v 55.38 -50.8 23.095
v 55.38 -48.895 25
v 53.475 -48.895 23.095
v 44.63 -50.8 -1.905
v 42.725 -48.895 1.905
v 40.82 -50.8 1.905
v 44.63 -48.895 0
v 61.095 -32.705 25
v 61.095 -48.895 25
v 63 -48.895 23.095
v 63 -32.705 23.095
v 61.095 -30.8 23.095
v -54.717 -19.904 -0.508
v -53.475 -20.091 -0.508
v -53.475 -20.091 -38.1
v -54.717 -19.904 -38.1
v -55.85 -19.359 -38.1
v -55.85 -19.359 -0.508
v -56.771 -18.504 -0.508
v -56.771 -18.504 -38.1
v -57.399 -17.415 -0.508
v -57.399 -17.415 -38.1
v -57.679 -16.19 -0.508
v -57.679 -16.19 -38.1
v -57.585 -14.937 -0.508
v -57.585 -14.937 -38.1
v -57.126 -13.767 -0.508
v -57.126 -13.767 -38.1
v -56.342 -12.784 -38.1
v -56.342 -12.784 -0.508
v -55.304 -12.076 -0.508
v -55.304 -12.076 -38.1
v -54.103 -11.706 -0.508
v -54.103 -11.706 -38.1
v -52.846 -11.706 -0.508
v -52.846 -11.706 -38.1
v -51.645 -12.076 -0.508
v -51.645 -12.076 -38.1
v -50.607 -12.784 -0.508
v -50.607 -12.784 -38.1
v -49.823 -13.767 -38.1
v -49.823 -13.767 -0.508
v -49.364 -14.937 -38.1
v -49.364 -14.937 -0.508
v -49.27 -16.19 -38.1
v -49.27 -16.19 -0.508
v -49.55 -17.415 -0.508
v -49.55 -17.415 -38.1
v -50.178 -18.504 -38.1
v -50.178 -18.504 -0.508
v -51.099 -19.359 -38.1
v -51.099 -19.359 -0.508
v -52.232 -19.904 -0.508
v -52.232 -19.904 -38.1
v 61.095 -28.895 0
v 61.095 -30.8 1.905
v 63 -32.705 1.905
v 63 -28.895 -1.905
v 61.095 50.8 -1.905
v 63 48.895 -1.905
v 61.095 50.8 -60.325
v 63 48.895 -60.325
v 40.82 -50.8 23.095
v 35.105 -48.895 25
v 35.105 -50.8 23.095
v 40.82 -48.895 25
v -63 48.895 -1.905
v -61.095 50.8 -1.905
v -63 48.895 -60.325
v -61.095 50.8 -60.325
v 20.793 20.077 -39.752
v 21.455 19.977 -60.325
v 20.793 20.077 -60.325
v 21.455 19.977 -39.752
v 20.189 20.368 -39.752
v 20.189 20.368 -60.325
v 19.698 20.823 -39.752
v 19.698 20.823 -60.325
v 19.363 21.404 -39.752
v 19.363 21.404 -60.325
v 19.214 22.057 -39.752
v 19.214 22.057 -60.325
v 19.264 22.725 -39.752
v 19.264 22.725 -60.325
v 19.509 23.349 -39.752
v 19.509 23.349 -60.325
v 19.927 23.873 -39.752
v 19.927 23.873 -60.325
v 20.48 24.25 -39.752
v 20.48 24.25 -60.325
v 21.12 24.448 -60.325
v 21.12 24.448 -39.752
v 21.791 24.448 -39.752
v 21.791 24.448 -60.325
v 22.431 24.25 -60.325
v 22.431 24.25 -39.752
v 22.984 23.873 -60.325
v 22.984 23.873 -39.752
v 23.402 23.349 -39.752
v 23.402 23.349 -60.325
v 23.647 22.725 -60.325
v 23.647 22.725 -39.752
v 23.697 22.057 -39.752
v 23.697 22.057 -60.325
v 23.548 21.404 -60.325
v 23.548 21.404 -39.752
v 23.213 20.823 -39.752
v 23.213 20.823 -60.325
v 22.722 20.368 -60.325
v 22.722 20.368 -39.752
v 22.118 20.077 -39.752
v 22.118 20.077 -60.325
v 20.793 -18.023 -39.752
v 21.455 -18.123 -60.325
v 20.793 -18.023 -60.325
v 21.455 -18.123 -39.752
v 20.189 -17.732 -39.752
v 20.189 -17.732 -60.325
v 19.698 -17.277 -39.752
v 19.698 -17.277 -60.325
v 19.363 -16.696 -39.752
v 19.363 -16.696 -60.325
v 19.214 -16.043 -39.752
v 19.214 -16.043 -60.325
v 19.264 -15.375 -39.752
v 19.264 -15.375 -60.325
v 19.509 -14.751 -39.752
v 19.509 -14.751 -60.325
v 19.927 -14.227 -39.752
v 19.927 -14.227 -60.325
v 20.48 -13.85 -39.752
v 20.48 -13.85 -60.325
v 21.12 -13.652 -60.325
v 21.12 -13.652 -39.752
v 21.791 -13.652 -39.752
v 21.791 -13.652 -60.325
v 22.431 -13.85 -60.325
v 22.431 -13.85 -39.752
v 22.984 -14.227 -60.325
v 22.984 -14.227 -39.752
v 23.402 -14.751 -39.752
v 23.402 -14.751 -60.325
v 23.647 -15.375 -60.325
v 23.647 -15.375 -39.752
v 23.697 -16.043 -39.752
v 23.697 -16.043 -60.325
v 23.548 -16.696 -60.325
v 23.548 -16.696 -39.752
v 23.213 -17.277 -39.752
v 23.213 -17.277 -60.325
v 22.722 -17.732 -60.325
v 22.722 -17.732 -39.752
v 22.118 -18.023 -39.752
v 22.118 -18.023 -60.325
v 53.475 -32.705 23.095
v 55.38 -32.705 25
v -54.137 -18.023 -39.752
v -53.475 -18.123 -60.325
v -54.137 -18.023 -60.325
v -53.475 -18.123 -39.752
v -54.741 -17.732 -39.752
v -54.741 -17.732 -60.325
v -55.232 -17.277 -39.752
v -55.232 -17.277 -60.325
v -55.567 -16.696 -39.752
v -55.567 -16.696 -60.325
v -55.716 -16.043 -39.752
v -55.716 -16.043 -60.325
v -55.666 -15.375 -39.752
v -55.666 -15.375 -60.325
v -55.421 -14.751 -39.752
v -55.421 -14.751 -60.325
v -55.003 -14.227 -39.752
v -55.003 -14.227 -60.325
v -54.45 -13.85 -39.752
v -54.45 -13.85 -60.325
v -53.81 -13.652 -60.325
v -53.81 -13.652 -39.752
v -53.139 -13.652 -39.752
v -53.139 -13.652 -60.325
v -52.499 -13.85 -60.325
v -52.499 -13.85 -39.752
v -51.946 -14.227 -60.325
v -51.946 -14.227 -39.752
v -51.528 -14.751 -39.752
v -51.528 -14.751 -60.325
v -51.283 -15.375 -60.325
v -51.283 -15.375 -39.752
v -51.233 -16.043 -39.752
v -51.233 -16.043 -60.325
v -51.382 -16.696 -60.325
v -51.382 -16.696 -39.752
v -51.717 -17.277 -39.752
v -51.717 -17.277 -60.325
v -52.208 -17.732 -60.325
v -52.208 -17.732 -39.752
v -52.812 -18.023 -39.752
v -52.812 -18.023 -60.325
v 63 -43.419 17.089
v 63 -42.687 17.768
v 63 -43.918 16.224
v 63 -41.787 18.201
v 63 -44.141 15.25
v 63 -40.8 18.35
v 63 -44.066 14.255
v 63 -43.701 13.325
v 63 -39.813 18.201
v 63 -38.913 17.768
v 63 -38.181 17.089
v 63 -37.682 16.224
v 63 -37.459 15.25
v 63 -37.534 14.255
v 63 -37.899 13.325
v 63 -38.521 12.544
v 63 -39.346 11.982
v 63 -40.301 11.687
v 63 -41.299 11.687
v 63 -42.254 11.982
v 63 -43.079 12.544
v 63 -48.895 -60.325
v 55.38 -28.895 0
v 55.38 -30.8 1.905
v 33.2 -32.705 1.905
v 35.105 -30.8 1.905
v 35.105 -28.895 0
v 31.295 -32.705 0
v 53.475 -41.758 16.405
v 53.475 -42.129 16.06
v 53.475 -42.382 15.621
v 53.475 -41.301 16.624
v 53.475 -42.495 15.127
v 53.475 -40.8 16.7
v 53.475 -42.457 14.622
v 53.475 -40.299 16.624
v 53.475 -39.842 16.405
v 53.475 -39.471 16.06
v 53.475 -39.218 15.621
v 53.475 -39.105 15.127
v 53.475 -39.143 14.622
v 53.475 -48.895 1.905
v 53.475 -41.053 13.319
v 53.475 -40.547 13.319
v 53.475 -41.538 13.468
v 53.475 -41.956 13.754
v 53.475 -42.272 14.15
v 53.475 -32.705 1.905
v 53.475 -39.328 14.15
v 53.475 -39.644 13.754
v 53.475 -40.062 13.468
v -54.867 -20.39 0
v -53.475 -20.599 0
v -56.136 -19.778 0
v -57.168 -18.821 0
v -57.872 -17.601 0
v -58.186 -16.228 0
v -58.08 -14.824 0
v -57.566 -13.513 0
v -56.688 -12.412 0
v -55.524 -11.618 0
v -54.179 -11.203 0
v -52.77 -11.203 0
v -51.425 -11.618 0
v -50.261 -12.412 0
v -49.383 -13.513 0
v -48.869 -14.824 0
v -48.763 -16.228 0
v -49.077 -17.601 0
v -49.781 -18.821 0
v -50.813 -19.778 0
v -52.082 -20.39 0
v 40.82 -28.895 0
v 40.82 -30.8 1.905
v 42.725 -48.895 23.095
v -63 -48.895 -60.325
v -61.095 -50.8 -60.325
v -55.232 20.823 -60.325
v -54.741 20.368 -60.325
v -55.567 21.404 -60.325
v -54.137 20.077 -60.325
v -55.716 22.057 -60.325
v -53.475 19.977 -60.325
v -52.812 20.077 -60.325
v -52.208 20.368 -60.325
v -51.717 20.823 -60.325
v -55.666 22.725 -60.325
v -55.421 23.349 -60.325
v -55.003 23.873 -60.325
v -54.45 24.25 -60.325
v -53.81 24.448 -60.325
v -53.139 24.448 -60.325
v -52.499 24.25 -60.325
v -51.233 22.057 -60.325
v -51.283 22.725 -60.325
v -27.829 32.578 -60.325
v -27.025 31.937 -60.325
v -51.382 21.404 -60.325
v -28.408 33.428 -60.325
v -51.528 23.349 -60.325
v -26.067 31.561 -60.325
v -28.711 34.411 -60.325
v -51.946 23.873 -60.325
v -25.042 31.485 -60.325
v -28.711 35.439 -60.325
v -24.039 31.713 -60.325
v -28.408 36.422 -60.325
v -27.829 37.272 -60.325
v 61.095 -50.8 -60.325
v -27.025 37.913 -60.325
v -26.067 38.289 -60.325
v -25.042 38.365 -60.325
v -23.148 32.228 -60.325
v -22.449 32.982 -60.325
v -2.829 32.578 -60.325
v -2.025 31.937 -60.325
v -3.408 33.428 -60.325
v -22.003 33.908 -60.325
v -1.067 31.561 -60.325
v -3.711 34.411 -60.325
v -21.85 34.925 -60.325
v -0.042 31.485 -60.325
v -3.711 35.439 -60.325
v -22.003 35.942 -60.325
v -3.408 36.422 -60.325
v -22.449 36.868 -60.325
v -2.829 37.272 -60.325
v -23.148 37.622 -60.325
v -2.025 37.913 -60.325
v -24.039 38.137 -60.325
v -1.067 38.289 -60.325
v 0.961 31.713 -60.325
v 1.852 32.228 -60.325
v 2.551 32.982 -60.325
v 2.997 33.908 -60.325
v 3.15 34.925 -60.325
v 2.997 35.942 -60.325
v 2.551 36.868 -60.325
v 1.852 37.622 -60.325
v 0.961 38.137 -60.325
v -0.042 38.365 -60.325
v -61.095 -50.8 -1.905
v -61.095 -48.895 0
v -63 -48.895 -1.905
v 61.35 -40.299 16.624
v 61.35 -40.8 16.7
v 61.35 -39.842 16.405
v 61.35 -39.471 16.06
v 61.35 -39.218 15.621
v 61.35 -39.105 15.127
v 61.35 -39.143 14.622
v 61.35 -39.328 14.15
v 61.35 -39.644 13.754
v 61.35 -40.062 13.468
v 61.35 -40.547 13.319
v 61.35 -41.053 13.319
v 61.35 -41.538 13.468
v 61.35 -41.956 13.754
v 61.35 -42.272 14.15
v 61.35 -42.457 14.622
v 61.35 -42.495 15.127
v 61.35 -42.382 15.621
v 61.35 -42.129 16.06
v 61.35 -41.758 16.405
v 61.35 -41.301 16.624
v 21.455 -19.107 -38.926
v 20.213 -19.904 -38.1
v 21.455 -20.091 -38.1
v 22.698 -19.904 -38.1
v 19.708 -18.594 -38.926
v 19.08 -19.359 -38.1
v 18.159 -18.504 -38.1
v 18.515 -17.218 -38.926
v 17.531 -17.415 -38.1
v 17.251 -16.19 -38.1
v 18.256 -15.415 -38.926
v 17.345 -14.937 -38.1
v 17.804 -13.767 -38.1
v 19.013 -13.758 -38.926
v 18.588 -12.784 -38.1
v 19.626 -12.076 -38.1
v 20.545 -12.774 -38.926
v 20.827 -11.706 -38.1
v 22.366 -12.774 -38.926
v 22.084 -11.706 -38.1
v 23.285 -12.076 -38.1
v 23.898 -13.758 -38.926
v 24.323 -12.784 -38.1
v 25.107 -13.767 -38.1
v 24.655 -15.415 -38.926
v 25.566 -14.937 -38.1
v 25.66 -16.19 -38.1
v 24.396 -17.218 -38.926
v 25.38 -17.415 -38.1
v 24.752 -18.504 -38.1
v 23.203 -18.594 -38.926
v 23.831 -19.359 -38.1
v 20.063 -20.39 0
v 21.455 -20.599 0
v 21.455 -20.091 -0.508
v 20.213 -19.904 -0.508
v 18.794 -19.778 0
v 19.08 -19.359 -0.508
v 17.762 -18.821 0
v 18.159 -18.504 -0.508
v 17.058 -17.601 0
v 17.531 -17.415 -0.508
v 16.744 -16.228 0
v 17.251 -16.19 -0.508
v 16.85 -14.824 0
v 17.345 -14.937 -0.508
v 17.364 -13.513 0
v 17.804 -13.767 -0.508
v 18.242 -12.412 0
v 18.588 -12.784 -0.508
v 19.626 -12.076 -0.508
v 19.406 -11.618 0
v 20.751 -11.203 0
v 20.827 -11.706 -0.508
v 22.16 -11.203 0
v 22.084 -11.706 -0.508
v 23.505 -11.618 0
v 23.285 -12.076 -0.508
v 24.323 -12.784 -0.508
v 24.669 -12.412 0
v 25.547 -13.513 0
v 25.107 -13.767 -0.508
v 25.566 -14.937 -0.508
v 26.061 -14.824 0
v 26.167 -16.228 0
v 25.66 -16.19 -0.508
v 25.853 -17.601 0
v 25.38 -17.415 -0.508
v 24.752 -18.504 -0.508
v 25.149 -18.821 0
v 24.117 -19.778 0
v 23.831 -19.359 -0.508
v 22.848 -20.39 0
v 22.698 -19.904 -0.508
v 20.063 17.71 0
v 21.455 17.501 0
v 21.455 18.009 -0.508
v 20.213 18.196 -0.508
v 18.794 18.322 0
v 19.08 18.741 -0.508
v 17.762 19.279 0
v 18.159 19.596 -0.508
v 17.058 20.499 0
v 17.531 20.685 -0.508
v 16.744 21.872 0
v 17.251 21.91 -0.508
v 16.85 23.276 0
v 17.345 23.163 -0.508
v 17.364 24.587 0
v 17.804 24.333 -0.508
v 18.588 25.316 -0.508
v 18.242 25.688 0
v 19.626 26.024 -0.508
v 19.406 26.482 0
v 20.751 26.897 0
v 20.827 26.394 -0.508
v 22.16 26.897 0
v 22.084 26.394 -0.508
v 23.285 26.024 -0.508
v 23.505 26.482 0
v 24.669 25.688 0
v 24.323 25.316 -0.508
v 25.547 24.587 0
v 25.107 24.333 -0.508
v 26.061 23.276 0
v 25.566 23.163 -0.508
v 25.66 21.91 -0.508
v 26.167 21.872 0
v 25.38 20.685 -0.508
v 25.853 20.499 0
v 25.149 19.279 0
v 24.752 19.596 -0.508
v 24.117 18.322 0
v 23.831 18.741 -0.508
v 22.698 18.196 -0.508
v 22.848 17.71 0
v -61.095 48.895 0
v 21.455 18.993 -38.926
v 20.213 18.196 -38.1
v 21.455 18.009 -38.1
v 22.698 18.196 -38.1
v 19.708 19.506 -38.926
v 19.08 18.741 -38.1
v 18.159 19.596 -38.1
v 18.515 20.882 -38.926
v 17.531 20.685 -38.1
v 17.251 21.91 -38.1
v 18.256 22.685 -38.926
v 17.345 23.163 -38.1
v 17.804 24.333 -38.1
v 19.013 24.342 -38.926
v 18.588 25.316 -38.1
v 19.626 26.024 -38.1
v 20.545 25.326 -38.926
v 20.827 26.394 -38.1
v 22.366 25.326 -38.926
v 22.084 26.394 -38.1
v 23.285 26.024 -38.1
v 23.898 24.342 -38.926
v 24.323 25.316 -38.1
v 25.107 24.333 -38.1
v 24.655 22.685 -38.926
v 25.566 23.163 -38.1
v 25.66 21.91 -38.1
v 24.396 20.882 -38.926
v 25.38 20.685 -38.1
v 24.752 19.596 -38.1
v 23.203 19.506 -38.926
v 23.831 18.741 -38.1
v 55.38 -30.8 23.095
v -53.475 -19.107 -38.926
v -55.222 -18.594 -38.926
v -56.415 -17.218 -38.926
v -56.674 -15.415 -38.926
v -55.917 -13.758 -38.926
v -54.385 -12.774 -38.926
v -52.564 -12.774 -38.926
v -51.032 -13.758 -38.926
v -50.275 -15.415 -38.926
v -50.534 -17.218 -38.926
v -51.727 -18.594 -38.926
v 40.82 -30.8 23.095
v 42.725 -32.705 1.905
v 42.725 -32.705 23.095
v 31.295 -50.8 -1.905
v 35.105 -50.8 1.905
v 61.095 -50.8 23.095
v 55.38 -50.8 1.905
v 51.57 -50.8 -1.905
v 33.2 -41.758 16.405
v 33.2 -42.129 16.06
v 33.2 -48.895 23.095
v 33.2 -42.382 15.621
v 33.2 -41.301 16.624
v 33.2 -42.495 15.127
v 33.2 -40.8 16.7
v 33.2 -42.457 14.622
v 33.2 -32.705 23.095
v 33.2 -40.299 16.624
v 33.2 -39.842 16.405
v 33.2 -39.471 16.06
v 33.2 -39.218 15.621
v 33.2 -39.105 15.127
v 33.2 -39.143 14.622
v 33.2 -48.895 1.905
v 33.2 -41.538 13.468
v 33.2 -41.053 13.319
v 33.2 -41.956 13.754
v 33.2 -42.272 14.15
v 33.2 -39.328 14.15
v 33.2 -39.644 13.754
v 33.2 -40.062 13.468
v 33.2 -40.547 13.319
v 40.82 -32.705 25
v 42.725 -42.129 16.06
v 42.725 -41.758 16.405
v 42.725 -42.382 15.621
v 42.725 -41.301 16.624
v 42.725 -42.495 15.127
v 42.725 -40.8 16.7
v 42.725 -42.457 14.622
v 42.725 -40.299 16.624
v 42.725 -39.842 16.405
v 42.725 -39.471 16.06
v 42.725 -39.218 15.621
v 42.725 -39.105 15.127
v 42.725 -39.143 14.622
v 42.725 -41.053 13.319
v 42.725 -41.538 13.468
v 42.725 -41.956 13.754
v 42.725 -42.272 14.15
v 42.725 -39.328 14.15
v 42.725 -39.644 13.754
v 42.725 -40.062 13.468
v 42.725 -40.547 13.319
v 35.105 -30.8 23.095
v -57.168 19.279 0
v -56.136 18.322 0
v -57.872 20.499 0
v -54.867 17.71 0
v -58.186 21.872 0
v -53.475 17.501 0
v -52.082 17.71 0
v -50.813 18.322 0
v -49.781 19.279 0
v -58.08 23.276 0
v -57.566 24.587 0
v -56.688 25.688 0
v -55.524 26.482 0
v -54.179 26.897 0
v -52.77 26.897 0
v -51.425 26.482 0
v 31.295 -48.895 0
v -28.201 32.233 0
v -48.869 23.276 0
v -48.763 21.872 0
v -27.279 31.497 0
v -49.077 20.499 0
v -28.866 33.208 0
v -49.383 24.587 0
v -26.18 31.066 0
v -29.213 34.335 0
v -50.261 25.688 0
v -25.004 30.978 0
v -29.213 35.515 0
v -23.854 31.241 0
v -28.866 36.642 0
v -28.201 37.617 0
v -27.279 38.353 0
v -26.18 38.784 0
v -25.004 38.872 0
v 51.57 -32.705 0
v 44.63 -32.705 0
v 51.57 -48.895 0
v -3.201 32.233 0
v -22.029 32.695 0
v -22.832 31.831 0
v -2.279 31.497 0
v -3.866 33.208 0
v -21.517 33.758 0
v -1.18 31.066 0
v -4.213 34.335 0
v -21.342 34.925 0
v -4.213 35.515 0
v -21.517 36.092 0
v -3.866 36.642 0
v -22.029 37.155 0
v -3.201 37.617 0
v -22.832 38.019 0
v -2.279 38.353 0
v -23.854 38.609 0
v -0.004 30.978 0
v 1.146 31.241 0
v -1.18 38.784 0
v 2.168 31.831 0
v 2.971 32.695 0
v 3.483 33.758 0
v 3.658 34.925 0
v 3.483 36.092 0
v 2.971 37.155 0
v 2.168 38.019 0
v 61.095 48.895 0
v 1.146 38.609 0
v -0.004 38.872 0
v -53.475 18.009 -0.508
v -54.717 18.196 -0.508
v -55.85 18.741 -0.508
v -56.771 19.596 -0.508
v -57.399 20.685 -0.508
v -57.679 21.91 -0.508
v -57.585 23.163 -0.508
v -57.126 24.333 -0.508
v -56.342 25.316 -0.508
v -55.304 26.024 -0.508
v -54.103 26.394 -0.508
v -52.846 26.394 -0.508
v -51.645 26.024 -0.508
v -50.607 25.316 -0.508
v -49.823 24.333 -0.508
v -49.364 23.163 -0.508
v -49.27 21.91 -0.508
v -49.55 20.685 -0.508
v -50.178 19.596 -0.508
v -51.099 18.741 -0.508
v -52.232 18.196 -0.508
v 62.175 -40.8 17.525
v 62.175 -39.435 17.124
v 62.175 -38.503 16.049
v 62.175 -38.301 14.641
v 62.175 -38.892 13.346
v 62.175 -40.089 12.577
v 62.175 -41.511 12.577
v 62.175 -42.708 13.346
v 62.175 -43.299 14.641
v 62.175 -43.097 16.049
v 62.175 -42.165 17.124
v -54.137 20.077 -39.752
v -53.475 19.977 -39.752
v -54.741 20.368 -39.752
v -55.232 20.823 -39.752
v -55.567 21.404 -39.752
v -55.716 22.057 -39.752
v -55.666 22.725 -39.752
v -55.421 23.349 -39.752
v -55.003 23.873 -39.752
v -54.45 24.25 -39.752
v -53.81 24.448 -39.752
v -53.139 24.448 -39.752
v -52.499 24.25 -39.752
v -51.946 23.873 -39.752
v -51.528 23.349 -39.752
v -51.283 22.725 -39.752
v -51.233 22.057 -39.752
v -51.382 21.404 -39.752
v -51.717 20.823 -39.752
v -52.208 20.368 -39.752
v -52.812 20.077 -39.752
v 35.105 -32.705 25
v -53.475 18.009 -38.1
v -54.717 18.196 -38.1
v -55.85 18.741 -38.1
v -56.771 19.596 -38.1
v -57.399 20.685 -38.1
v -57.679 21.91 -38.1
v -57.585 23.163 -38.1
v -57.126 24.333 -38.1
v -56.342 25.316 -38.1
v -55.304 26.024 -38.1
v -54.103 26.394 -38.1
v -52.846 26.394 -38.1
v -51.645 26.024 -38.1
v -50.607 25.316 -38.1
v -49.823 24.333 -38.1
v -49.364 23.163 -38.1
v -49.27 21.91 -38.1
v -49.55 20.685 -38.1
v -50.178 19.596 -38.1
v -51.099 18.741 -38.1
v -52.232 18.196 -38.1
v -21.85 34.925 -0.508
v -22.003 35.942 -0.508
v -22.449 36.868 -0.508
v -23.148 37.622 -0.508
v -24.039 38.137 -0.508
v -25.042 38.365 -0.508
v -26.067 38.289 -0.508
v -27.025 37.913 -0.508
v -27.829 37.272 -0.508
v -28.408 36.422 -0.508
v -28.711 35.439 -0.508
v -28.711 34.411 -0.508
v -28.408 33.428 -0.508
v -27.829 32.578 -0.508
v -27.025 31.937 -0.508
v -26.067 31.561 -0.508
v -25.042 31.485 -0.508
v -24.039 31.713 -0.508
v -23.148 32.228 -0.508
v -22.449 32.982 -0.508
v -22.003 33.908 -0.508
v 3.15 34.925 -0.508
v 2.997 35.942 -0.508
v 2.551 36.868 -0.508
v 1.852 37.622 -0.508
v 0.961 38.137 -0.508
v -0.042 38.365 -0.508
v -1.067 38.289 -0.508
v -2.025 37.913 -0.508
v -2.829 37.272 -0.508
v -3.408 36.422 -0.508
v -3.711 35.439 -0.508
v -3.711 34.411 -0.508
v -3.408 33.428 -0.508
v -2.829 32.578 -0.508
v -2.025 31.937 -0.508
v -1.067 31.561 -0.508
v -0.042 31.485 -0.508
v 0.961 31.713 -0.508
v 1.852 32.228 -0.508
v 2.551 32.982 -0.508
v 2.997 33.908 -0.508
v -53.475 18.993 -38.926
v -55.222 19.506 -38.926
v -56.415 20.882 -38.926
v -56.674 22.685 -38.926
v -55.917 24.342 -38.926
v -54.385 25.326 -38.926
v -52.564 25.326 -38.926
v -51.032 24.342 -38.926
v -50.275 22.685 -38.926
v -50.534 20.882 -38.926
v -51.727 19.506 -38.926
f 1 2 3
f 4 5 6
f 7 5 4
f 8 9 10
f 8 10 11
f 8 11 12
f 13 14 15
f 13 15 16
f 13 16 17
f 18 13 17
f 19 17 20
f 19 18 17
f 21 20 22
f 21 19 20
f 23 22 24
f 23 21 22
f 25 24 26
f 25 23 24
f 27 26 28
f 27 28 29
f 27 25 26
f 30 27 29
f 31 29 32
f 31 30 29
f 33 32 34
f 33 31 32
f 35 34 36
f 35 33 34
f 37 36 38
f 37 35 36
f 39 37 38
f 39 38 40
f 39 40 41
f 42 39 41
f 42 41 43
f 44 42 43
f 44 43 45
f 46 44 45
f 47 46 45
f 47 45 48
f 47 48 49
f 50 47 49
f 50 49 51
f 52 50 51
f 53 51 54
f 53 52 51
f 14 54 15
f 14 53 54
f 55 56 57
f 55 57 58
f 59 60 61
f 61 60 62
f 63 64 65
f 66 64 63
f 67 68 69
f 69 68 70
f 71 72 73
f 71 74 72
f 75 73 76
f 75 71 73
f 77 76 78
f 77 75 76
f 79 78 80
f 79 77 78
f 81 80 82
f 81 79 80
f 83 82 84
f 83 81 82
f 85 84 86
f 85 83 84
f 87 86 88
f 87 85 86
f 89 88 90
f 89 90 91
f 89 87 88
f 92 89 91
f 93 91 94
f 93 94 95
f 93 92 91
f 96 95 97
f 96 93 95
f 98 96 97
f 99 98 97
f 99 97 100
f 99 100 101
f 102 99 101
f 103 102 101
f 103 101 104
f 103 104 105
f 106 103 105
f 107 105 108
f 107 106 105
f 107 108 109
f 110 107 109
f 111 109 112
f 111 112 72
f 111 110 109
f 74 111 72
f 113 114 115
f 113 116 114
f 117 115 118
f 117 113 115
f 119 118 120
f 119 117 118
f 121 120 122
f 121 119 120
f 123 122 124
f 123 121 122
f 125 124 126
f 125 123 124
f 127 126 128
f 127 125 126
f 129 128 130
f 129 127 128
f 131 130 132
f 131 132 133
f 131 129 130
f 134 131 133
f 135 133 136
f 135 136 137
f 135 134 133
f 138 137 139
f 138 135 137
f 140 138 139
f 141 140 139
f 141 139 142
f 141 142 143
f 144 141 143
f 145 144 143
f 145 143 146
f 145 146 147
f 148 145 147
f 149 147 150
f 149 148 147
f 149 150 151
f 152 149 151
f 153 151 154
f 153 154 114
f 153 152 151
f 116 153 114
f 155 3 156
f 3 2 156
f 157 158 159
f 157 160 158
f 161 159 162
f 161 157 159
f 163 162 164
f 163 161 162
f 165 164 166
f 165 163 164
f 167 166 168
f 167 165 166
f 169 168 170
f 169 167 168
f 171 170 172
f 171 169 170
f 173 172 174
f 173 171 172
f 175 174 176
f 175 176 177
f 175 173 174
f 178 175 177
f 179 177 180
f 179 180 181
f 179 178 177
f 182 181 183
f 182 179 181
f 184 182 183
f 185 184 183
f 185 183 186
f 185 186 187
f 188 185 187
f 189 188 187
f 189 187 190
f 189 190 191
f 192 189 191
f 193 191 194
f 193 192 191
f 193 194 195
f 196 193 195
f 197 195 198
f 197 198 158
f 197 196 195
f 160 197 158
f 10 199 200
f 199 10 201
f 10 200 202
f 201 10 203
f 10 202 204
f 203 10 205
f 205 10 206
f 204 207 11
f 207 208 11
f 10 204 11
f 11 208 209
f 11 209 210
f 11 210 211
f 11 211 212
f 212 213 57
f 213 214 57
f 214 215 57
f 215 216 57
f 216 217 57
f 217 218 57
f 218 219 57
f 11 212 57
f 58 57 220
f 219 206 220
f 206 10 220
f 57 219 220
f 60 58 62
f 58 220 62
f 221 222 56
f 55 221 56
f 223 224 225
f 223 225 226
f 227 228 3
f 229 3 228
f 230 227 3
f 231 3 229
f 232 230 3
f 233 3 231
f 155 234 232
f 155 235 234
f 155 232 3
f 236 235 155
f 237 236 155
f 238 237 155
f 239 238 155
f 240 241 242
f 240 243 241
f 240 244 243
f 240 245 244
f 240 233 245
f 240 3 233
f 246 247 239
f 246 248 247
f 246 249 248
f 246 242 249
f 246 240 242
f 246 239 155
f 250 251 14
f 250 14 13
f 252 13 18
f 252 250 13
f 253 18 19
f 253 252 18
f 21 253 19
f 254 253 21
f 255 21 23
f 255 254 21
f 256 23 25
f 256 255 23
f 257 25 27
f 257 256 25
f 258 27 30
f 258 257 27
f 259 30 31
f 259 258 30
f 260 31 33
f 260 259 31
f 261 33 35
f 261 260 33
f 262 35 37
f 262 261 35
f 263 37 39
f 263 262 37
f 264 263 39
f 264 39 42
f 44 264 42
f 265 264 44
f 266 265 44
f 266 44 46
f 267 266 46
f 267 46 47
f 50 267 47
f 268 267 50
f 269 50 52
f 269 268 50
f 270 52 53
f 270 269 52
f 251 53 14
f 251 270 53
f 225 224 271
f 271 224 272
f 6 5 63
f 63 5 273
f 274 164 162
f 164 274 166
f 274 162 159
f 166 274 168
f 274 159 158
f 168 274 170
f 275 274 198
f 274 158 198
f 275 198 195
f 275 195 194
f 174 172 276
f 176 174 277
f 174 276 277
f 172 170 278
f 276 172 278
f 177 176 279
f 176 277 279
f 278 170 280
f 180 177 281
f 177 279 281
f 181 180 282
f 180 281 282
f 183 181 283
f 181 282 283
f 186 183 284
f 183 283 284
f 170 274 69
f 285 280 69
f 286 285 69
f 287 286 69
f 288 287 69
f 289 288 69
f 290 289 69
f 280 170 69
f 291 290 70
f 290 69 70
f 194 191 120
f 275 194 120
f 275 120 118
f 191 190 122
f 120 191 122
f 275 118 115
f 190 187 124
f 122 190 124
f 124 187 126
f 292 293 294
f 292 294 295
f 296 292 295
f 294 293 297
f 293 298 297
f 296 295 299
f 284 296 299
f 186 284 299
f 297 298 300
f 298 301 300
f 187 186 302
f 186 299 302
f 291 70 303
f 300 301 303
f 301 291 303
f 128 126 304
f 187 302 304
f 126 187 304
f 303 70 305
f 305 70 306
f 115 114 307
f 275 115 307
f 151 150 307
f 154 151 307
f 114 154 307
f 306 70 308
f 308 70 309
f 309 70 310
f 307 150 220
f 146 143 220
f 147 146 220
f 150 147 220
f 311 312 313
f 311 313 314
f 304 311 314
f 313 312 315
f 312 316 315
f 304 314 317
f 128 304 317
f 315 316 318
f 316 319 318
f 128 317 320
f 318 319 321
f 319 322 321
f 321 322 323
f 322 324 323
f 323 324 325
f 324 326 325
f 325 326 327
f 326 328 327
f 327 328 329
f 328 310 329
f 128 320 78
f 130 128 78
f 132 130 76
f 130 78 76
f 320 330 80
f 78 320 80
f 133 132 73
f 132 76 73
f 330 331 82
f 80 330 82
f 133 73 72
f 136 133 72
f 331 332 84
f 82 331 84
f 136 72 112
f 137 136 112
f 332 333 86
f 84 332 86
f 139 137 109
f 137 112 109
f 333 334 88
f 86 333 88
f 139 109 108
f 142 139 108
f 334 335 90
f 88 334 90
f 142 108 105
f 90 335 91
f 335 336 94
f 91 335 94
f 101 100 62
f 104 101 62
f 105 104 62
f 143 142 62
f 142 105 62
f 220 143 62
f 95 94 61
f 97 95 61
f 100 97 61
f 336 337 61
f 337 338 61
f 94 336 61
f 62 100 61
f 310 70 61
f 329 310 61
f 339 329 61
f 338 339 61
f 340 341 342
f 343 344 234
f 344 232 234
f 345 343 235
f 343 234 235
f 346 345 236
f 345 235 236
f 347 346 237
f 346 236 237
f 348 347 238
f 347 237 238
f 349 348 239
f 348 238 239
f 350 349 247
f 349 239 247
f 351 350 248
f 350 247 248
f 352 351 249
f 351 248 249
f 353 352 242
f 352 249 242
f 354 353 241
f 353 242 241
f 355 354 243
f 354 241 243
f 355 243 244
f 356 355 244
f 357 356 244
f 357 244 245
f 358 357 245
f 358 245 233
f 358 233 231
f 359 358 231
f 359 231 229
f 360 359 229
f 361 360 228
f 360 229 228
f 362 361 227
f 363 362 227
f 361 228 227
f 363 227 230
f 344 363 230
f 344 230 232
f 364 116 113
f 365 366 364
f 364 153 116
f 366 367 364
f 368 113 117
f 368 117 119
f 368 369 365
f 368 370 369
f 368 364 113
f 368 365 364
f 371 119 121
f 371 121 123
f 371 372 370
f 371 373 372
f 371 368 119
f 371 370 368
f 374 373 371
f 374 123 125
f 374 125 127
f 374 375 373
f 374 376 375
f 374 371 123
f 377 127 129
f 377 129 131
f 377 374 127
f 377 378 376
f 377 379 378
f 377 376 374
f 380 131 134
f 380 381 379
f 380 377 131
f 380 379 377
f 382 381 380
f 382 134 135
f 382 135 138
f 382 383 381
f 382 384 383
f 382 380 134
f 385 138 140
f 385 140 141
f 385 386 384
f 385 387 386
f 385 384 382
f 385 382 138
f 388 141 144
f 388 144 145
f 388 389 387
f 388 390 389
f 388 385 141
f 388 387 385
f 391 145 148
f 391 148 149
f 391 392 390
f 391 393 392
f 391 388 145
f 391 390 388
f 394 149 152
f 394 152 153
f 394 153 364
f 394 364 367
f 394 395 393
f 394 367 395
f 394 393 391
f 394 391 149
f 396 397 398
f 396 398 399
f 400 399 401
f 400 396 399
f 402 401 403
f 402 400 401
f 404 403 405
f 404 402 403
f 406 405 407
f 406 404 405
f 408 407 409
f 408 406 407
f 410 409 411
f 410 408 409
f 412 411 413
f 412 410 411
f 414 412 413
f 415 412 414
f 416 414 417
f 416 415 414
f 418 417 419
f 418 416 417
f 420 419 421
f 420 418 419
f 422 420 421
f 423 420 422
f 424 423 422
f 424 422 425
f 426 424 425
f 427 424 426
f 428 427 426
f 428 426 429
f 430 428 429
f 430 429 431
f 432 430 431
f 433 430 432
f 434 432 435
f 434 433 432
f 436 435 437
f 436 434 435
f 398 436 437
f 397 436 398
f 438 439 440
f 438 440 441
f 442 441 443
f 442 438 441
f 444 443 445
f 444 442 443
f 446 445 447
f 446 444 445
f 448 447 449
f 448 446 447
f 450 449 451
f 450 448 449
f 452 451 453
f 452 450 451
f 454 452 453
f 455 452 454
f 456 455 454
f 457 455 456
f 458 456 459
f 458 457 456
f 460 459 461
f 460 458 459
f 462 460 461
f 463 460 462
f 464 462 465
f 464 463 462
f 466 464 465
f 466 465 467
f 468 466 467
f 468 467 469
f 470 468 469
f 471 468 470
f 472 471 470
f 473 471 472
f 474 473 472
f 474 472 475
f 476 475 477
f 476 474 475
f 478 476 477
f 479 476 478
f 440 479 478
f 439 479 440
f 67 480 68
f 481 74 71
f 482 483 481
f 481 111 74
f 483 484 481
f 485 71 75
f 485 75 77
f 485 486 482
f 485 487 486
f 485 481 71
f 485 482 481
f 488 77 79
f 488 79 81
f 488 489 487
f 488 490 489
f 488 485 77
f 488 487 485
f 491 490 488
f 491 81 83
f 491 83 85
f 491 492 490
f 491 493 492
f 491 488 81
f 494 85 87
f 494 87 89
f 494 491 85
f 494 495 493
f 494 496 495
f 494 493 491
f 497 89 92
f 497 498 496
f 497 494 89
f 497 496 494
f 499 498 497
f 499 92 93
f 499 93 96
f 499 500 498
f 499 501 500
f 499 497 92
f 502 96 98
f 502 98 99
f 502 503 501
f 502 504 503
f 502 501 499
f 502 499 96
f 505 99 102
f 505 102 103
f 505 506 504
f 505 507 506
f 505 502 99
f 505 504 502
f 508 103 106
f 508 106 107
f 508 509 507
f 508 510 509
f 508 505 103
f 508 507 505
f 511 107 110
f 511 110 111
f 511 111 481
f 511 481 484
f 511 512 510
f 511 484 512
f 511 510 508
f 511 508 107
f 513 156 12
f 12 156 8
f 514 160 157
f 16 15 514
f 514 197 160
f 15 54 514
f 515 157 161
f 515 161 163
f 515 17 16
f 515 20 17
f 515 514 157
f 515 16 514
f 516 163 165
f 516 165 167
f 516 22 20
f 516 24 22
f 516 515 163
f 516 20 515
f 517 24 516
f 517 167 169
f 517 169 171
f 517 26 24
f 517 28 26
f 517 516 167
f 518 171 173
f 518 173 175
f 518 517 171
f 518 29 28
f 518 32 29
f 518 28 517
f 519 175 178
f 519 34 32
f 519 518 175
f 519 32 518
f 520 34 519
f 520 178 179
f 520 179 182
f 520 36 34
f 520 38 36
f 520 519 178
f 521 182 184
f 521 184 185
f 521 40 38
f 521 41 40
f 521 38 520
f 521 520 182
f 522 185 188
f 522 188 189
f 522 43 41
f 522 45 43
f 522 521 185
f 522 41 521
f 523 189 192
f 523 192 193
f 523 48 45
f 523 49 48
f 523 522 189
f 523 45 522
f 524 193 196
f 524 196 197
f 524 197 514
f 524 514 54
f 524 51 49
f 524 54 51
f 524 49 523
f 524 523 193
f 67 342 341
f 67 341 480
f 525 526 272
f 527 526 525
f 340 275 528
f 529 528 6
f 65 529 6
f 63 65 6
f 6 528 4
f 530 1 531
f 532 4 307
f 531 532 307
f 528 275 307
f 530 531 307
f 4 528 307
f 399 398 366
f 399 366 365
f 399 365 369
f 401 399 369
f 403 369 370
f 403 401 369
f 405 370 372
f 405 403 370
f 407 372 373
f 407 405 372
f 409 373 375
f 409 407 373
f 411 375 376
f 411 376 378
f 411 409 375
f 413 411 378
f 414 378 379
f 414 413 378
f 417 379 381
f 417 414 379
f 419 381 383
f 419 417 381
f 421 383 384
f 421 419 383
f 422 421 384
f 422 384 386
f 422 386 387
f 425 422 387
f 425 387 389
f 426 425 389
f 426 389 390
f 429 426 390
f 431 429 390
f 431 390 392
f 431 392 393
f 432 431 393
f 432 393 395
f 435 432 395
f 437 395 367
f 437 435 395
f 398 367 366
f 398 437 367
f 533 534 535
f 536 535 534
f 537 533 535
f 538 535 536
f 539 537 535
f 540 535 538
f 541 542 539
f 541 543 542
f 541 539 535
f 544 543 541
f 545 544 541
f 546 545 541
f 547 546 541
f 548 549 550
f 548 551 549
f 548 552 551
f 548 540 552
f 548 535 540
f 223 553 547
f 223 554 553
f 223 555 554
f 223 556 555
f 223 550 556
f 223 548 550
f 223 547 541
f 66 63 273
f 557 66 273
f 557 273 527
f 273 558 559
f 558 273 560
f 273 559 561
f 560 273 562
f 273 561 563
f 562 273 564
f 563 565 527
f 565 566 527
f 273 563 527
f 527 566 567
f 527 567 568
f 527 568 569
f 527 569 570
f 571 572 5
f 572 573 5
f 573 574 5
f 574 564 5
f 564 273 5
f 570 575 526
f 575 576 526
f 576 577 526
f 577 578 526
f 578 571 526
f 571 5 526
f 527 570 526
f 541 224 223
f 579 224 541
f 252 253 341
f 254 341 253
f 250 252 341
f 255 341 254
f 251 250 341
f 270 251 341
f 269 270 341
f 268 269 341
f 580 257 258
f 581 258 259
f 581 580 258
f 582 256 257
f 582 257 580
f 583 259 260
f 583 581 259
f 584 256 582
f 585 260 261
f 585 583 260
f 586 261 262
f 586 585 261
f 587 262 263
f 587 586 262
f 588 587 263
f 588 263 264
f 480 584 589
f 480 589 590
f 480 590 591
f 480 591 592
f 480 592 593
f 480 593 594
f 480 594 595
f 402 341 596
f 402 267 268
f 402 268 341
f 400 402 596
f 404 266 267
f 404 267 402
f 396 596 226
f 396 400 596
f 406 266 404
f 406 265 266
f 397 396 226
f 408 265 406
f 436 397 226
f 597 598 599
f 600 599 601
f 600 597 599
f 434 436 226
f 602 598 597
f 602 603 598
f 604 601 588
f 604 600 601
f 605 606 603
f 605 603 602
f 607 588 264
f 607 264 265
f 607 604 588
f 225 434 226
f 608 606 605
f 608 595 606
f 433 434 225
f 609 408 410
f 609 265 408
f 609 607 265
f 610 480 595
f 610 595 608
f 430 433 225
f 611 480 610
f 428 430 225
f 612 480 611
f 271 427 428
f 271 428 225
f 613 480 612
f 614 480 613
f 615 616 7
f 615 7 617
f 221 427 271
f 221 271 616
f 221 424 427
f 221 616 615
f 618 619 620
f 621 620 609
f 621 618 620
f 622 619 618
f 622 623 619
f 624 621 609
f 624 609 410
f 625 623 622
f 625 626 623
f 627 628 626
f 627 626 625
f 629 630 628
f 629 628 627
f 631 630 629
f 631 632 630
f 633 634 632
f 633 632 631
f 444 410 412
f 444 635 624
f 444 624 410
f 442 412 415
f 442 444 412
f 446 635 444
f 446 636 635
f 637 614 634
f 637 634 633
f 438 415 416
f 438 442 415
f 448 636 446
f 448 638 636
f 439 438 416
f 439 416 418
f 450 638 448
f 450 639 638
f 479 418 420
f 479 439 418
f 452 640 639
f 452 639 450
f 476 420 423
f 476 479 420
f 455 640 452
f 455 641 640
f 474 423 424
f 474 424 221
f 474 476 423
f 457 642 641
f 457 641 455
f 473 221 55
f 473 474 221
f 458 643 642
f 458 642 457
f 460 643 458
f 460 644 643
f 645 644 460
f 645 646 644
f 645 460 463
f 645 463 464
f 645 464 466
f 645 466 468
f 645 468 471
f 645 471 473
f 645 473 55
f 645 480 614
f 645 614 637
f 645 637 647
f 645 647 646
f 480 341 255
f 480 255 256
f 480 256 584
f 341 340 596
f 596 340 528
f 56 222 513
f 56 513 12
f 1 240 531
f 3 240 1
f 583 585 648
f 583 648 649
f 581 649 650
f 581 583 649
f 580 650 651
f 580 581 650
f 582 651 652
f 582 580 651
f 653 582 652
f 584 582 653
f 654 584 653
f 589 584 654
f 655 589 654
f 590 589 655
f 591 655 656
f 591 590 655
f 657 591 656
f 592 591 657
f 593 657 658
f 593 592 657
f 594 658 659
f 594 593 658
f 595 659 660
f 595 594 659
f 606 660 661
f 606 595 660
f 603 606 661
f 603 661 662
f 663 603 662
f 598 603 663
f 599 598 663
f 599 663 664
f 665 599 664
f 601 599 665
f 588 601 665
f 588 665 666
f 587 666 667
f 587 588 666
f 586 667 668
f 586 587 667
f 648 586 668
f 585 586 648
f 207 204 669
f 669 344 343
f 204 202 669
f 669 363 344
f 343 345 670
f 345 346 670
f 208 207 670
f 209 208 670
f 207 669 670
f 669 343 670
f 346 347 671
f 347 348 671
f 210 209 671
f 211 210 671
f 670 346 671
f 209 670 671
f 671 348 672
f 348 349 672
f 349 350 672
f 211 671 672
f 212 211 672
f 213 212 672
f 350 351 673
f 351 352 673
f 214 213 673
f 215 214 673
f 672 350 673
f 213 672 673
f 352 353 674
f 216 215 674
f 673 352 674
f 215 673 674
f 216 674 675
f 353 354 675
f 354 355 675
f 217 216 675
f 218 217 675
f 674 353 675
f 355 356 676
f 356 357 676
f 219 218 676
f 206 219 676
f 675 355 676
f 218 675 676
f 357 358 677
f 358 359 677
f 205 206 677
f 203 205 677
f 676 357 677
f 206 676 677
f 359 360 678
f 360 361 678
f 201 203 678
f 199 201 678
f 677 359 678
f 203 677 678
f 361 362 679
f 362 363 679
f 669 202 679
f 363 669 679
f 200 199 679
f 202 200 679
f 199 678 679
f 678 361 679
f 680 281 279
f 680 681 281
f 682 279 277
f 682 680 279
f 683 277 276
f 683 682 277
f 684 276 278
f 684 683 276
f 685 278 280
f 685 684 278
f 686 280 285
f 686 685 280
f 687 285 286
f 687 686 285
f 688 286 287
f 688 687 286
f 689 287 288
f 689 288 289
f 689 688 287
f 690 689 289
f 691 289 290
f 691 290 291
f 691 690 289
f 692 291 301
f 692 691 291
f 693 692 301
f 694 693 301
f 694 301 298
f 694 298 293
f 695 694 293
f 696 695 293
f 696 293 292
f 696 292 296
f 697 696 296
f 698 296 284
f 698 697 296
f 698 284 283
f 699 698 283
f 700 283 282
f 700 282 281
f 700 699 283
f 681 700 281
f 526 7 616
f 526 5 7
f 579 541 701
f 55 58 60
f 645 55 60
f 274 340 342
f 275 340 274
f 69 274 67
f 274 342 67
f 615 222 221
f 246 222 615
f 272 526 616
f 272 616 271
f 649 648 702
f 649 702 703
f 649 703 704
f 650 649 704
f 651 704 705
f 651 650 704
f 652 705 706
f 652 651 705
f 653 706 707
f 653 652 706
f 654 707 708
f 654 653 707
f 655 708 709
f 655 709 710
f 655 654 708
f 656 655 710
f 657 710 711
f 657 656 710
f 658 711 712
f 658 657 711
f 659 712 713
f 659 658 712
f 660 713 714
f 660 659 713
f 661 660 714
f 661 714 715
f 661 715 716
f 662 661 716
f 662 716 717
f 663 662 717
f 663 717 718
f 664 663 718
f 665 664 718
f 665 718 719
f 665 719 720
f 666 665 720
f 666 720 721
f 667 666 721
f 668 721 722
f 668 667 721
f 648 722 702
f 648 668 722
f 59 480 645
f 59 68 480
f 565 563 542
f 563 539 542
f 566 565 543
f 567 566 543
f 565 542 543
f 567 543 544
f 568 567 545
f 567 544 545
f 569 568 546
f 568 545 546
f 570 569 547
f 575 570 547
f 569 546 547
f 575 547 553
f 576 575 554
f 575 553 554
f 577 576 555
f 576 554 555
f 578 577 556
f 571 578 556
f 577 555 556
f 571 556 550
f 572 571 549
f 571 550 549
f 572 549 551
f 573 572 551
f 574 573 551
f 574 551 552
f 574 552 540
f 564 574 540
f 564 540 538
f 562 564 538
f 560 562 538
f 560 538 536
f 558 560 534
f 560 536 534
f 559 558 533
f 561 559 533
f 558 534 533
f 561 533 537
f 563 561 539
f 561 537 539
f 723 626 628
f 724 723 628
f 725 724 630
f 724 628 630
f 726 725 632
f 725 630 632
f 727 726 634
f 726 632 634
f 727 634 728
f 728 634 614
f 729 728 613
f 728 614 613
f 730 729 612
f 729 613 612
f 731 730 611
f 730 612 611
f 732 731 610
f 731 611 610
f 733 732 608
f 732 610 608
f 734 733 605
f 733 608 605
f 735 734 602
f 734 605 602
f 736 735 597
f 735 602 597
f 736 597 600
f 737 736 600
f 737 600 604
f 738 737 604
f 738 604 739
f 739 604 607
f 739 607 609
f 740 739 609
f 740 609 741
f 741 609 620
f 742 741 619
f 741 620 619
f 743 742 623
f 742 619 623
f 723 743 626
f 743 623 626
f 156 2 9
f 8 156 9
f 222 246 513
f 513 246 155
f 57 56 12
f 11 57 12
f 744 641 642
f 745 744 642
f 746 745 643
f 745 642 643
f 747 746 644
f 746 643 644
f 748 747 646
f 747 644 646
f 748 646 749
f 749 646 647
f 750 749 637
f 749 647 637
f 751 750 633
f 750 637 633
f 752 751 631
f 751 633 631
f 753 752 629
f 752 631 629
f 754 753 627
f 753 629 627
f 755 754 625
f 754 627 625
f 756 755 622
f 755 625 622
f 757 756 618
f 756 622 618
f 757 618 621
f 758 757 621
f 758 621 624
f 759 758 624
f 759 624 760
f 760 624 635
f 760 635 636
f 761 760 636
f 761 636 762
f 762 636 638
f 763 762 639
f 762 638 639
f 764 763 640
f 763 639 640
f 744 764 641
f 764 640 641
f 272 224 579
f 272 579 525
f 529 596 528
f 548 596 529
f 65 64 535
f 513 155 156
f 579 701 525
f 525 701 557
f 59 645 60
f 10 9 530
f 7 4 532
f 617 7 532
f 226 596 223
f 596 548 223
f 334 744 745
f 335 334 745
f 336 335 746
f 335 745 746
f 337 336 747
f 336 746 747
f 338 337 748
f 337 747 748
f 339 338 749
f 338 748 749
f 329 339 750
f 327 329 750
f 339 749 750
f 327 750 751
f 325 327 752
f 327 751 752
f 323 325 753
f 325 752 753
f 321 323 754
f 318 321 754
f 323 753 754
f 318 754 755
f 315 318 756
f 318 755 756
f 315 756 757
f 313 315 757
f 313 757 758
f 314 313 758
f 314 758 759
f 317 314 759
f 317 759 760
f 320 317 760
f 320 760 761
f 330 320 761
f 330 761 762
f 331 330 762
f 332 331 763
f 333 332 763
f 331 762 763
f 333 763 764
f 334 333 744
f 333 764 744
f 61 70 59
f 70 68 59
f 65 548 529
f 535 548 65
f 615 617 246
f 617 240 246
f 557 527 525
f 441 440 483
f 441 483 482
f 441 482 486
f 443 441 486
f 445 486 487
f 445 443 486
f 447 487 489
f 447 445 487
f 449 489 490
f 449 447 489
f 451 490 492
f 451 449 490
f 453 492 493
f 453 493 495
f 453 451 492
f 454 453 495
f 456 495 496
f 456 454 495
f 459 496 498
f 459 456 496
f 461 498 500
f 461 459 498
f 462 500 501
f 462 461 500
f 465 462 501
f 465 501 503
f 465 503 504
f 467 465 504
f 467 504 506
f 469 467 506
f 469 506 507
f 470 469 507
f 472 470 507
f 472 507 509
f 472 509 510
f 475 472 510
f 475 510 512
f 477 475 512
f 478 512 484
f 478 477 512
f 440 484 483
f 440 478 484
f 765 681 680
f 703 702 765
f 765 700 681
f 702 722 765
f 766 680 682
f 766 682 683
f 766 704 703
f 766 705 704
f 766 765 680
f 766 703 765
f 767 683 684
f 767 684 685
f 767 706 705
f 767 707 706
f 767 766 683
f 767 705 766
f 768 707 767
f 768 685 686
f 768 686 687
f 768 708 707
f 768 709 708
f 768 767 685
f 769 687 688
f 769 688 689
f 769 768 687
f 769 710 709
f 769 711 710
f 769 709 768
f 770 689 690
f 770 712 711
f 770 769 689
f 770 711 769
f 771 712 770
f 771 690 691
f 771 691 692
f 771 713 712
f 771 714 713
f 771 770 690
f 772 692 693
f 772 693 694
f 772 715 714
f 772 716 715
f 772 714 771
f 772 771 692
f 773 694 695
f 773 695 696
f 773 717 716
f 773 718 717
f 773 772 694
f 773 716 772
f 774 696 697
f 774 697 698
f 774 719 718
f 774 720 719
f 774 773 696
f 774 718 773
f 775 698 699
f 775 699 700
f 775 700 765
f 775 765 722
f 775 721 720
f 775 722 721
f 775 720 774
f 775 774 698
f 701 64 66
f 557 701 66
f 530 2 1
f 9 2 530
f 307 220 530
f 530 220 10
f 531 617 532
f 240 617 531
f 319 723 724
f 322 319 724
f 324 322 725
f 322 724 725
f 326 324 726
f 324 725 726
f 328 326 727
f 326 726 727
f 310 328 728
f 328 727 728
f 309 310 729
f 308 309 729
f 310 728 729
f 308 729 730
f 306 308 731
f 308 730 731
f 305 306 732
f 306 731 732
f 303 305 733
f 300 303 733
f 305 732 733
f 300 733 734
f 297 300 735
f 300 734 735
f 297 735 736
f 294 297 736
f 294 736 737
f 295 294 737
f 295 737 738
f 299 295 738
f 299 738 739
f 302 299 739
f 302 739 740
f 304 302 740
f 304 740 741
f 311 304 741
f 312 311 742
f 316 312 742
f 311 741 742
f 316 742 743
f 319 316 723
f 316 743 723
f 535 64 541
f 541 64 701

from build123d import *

# Parameters (mm, degrees)
SKETCH1_W                                       = 125.999061968
SKETCH1_H                                       = 101.6
SKETCH1_R                                       = 1.27
SKETCH1_R_2                                     = 3.45
BOSS_EXTRUDE1_DEPTH                             = 60.325
SKETCH1_3_W                                     = 9.525
SKETCH1_3_H                                     = 20
BOSS_EXTRUDE2_DEPTH                             = 25
CUT_EXTRUDE1_DEPTH                              = 149.645582651
CUT_EXTRUDE1_DEPTH_BACK                         = 149.645582651
SKETCH2_R                                       = 1.5999968
CSK_FOR_8_FLAT_HEAD_MACHINE_SCREW_2_COUNT       = 2
CSK_FOR_8_FLAT_HEAD_MACHINE_SCREW_2_PITCH       = 38.1
CSK_FOR_8_FLAT_HEAD_MACHINE_SCREW_3_COUNT       = 2
CSK_FOR_8_FLAT_HEAD_MACHINE_SCREW_3_PITCH       = 84.060186176
CSK_FOR_8_FLAT_HEAD_MACHINE_SCREW_4_COUNT       = 2
CSK_FOR_8_FLAT_HEAD_MACHINE_SCREW_4_PITCH       = 74.93
CSK_FOR_M3_FLAT_HEAD_MACHINE_SCREW1_D           = 3.4
CSK_FOR_M3_FLAT_HEAD_MACHINE_SCREW1_CSINK_D     = 6.7
CSK_FOR_M3_FLAT_HEAD_MACHINE_SCREW1_CSINK_ANGLE = 90
CHAMFER1_SIZE                                   = 0.508
CHAMFER2_SIZE                                   = 1.905


with BuildPart() as part:
    # Sketch1 → Boss-Extrude1 (new body)
    with BuildSketch(Plane.XY):
        Rectangle(SKETCH1_W, SKETCH1_H)
        with Locations((-53.474530984, -15.875)):
            Circle(SKETCH1_R, mode=Mode.SUBTRACT)
        with Locations((21.455469016, -15.875)):
            Circle(SKETCH1_R, mode=Mode.SUBTRACT)
        with Locations((-53.474530984, 22.225)):
            Circle(SKETCH1_R, mode=Mode.SUBTRACT)
        with Locations((-25.299530984, 34.925)):
            Circle(SKETCH1_R_2, mode=Mode.SUBTRACT)
        with Locations((-0.299530984, 34.925)):
            Circle(SKETCH1_R_2, mode=Mode.SUBTRACT)
        with Locations((21.455469016, 22.225)):
            Circle(SKETCH1_R, mode=Mode.SUBTRACT)
    extrude(amount=-BOSS_EXTRUDE1_DEPTH)

    # Sketch1<3> → Boss-Extrude2 (add)
    with BuildSketch(Plane.XY):
        with Locations((58.237030984, -40.8)):
            Rectangle(SKETCH1_3_W, SKETCH1_3_H)
        with Locations((37.962030984, -40.8)):
            Rectangle(SKETCH1_3_W, SKETCH1_3_H)
    extrude(amount=BOSS_EXTRUDE2_DEPTH)

    # Sketch2 → Cut-Extrude1 (cut, two sides: drawn at the far end of the back side and taken through both)
    with BuildSketch(Plane(origin=(62.999530984, 0, 0), x_dir=(0, 0, -1), z_dir=(1, 0, 0)).offset(-CUT_EXTRUDE1_DEPTH_BACK)):
        with Locations((-15, -40.8)):
            Circle(SKETCH2_R)
    extrude(amount=CUT_EXTRUDE1_DEPTH + CUT_EXTRUDE1_DEPTH_BACK, mode=Mode.SUBTRACT)

    # Sketch6 → CSK for #8 Flat Head Machine Screw (100)1 (revolve, cut)
    with BuildSketch(Plane(origin=(-53.474530984, 22.225, 0), x_dir=(0, -1, 0), z_dir=(1, 0, 0))):
        Polygon((0, 0), (0, 60.325), (2.2479, 60.325), (2.2479, 39.751763788), (4.216395428, 38.1), (4.216395428, 0), align=None)
    csk_for_8_flat_head_machine_screw_100 = revolve(axis=Axis((-53.474530984, 22.225, 6.35), (0, 0, -1)), mode=Mode.SUBTRACT)

    # CSK for _8 Flat Head Machine Screw _ 2: CSK for #8 Flat Head Machine Screw (100)1 ×2
    with Locations(*[(0, -i * CSK_FOR_8_FLAT_HEAD_MACHINE_SCREW_2_PITCH, 0) for i in range(1, CSK_FOR_8_FLAT_HEAD_MACHINE_SCREW_2_COUNT)]):
        add(csk_for_8_flat_head_machine_screw_100, mode=Mode.SUBTRACT)

    # CSK for _8 Flat Head Machine Screw _ 3: CSK for #8 Flat Head Machine Screw (100)1 ×2
    with Locations(*[Vector(0.8913851302068038, -0.453246676376341, 0) * (i * CSK_FOR_8_FLAT_HEAD_MACHINE_SCREW_3_PITCH) for i in range(1, CSK_FOR_8_FLAT_HEAD_MACHINE_SCREW_3_COUNT)]):
        add(csk_for_8_flat_head_machine_screw_100, mode=Mode.SUBTRACT)

    # CSK for _8 Flat Head Machine Screw _ 4: CSK for #8 Flat Head Machine Screw (100)1 ×2
    with Locations(*[(i * CSK_FOR_8_FLAT_HEAD_MACHINE_SCREW_4_PITCH, 0, 0) for i in range(1, CSK_FOR_8_FLAT_HEAD_MACHINE_SCREW_4_COUNT)]):
        add(csk_for_8_flat_head_machine_screw_100, mode=Mode.SUBTRACT)

    # CSK for M3 Flat Head Machine Screw1 (through all)
    with Locations(Plane(origin=(62.999530984, 0, 0), x_dir=(0, 0, -1), z_dir=(1, 0, 0))):
        with Locations((-15, -40.8)):
            CounterSinkHole(CSK_FOR_M3_FLAT_HEAD_MACHINE_SCREW1_D / 2, CSK_FOR_M3_FLAT_HEAD_MACHINE_SCREW1_CSINK_D / 2, counter_sink_angle=CSK_FOR_M3_FLAT_HEAD_MACHINE_SCREW1_CSINK_ANGLE)

    # Chamfer1
    chamfer1_edges = [part.edges().sort_by_distance(p)[0] for p in [
        (-3.749530984, 34.925, 0),
        (-28.749530984, 34.925, 0),
        (21.455469016, -11.658604572, 0),
        (-53.474530984, 26.441395428, 0),
        (-53.474530984, -11.658604572, 0),
        (21.455469016, 26.441395428, 0),
    ]]
    chamfer(chamfer1_edges, length=CHAMFER1_SIZE)

    # Chamfer2
    chamfer2_edges = [part.edges().sort_by_distance(p)[0] for p in [
        (53.474530984, -50.8, 12.5),
        (42.724530984, -50.8, 12.5),
        (48.099530984, -50.8, 0),
        (53.474530984, -40.8, 0),
        (42.724530984, -40.8, 0),
        (33.199530984, -50.8, 12.5),
        (62.999530984, -30.8, 12.5),
        (58.237030984, -30.8, 25),
        (62.999530984, -40.8, 25),
        (62.999530984, -50.8, -17.6625),
        (58.237030984, -50.8, 25),
        (53.474530984, -40.8, 25),
        (53.474530984, -30.8, 12.5),
        (58.237030984, -30.8, 0),
        (42.724530984, -30.8, 12.5),
        (37.962030984, -30.8, 25),
        (42.724530984, -40.8, 25),
        (37.962030984, -50.8, 25),
        (33.199530984, -40.8, 25),
        (33.199530984, -30.8, 12.5),
        (37.962030984, -30.8, 0),
        (-62.999530984, 50.8, -30.1625),
        (-62.999530984, -50.8, -30.1625),
        (62.999530984, 50.8, -30.1625),
        (33.199530984, -40.8, 0),
        (62.999530984, 10, 0),
        (-14.9, -50.8, 0),
        (-62.999530984, 0, 0),
        (0, 50.8, 0),
    ]]
    chamfer(chamfer2_edges, length=CHAMFER2_SIZE)


solid = part.part
